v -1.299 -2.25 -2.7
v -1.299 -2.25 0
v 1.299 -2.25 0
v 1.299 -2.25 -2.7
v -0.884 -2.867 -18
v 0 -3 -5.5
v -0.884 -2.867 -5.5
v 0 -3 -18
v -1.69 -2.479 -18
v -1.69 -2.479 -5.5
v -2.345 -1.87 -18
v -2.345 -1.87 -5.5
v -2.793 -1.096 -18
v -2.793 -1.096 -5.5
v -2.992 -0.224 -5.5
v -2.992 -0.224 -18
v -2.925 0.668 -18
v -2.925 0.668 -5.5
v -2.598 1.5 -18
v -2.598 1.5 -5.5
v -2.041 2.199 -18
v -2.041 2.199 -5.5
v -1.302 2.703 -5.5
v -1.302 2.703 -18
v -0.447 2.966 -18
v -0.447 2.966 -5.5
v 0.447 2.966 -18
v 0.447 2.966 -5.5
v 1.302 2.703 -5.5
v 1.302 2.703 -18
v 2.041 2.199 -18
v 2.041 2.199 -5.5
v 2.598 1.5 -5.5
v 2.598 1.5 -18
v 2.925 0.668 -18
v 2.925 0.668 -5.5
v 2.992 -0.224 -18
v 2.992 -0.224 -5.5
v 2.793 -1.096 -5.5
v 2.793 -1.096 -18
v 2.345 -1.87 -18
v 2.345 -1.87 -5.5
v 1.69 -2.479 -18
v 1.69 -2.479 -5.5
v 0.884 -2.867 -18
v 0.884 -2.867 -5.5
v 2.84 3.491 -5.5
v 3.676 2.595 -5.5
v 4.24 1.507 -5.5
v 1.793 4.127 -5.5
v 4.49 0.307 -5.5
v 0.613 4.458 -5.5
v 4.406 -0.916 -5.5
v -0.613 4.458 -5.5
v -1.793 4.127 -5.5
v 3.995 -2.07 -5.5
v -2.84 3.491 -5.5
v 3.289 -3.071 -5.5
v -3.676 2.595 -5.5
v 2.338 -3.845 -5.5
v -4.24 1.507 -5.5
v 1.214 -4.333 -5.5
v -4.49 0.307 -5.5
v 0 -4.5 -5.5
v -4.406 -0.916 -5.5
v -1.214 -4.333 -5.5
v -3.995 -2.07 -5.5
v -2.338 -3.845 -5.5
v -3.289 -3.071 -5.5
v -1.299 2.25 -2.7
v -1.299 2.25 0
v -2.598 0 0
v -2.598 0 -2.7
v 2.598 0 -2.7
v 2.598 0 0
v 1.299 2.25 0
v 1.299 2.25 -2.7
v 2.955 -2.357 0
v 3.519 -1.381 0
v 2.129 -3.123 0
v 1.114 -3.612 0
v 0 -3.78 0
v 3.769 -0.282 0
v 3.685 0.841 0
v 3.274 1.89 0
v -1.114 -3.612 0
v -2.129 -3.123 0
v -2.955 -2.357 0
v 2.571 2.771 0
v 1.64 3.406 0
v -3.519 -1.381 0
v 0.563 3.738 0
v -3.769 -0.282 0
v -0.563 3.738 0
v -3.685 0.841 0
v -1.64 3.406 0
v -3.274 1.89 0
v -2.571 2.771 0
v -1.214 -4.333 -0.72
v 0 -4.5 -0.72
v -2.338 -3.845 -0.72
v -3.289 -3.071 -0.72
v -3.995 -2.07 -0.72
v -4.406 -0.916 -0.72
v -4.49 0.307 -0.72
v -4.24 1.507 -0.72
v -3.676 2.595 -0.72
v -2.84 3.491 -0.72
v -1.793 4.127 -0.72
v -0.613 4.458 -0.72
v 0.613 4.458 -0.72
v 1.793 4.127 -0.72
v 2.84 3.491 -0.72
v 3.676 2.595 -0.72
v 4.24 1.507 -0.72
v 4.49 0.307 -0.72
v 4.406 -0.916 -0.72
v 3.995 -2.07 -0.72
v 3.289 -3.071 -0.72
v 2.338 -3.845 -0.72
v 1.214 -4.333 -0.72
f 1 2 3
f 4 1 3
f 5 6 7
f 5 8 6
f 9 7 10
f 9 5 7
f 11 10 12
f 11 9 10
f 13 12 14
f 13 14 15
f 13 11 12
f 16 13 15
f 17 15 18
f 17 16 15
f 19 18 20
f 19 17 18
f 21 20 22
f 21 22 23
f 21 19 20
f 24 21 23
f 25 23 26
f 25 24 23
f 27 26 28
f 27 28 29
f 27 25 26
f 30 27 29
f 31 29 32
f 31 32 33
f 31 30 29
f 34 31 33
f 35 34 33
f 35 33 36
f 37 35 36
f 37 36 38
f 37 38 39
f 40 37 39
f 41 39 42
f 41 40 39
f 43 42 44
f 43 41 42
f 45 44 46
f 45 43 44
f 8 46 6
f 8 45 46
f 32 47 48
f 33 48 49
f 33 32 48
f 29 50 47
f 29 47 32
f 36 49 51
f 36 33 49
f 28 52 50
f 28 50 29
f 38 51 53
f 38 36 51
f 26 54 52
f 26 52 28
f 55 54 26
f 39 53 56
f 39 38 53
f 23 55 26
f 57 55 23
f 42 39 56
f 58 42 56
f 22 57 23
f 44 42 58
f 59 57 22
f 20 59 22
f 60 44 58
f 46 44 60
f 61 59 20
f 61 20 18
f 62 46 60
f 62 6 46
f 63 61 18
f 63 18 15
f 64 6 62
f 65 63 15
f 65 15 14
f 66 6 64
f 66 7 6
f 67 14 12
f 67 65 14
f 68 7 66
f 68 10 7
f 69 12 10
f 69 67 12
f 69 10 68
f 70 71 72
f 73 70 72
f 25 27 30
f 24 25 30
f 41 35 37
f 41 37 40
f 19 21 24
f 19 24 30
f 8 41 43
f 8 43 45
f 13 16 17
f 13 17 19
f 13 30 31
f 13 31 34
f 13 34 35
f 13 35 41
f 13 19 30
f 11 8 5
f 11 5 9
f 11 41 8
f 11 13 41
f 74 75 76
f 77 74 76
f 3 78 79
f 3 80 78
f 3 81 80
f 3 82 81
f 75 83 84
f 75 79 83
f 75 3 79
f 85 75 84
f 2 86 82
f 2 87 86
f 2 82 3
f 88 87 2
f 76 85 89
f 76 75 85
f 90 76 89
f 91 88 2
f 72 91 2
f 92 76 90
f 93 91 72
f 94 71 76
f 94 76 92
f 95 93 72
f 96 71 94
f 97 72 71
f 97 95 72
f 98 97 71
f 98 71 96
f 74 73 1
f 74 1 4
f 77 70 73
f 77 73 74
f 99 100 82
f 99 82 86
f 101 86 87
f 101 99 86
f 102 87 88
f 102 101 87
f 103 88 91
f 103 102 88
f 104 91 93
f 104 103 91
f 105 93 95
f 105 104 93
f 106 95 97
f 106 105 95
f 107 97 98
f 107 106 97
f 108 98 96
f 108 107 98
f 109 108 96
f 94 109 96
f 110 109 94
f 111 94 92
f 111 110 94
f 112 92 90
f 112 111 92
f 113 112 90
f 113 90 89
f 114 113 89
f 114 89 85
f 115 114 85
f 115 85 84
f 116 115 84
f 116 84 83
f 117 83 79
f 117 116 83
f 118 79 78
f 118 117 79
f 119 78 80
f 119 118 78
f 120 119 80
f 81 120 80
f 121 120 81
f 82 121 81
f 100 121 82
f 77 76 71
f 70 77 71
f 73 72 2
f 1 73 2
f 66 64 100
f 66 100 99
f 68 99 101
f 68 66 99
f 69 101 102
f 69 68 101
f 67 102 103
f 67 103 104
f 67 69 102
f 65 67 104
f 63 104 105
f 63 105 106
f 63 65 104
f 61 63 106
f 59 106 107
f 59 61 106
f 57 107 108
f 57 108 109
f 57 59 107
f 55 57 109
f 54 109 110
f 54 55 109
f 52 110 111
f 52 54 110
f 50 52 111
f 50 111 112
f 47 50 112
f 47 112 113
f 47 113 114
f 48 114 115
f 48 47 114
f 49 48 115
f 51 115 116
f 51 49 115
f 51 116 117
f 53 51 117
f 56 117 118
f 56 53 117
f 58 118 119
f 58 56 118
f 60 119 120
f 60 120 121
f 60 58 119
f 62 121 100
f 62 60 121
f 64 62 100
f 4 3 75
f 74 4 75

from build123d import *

# Parameters (mm, degrees)
CHAMFER_1_SIZE      = 0.72
CUT_EXTRUDE_1_DEPTH = 2.7


with BuildPart() as part:
    # 草图2 → 旋转1 (revolve)
    with BuildSketch(Plane(origin=(0, 0, 0), x_dir=(0, 0, -1), z_dir=(1, 0, 0)), mode=Mode.PRIVATE) as revolve_1_sk:
        Polygon((0, 0), (0, 4.5), (5.5, 4.5), (5.5, 3), (18, 3), (18, 0), align=None)
    revolve(revolve_1_sk.sketch.rotate(Axis((0, 0, 0), (0, 0, -1)), 180), axis=Axis((0, 0, 0), (0, 0, -1)))

    # 倒角1
    chamfer_1_edges = [part.edges().sort_by_distance(p)[0] for p in [
        (0, 4.5, 0),
    ]]
    chamfer(chamfer_1_edges, length=CHAMFER_1_SIZE)

    # 草图3 → 切除-拉伸1 (cut)
    with BuildSketch(Plane.XY):
        Polygon((2.598076211, 0), (1.299038106, 2.25), (-1.299038106, 2.25), (-2.598076211, 0), (-1.299038106, -2.25), (1.299038106, -2.25), align=None)
    extrude(amount=-CUT_EXTRUDE_1_DEPTH, mode=Mode.SUBTRACT)


solid = part.part
